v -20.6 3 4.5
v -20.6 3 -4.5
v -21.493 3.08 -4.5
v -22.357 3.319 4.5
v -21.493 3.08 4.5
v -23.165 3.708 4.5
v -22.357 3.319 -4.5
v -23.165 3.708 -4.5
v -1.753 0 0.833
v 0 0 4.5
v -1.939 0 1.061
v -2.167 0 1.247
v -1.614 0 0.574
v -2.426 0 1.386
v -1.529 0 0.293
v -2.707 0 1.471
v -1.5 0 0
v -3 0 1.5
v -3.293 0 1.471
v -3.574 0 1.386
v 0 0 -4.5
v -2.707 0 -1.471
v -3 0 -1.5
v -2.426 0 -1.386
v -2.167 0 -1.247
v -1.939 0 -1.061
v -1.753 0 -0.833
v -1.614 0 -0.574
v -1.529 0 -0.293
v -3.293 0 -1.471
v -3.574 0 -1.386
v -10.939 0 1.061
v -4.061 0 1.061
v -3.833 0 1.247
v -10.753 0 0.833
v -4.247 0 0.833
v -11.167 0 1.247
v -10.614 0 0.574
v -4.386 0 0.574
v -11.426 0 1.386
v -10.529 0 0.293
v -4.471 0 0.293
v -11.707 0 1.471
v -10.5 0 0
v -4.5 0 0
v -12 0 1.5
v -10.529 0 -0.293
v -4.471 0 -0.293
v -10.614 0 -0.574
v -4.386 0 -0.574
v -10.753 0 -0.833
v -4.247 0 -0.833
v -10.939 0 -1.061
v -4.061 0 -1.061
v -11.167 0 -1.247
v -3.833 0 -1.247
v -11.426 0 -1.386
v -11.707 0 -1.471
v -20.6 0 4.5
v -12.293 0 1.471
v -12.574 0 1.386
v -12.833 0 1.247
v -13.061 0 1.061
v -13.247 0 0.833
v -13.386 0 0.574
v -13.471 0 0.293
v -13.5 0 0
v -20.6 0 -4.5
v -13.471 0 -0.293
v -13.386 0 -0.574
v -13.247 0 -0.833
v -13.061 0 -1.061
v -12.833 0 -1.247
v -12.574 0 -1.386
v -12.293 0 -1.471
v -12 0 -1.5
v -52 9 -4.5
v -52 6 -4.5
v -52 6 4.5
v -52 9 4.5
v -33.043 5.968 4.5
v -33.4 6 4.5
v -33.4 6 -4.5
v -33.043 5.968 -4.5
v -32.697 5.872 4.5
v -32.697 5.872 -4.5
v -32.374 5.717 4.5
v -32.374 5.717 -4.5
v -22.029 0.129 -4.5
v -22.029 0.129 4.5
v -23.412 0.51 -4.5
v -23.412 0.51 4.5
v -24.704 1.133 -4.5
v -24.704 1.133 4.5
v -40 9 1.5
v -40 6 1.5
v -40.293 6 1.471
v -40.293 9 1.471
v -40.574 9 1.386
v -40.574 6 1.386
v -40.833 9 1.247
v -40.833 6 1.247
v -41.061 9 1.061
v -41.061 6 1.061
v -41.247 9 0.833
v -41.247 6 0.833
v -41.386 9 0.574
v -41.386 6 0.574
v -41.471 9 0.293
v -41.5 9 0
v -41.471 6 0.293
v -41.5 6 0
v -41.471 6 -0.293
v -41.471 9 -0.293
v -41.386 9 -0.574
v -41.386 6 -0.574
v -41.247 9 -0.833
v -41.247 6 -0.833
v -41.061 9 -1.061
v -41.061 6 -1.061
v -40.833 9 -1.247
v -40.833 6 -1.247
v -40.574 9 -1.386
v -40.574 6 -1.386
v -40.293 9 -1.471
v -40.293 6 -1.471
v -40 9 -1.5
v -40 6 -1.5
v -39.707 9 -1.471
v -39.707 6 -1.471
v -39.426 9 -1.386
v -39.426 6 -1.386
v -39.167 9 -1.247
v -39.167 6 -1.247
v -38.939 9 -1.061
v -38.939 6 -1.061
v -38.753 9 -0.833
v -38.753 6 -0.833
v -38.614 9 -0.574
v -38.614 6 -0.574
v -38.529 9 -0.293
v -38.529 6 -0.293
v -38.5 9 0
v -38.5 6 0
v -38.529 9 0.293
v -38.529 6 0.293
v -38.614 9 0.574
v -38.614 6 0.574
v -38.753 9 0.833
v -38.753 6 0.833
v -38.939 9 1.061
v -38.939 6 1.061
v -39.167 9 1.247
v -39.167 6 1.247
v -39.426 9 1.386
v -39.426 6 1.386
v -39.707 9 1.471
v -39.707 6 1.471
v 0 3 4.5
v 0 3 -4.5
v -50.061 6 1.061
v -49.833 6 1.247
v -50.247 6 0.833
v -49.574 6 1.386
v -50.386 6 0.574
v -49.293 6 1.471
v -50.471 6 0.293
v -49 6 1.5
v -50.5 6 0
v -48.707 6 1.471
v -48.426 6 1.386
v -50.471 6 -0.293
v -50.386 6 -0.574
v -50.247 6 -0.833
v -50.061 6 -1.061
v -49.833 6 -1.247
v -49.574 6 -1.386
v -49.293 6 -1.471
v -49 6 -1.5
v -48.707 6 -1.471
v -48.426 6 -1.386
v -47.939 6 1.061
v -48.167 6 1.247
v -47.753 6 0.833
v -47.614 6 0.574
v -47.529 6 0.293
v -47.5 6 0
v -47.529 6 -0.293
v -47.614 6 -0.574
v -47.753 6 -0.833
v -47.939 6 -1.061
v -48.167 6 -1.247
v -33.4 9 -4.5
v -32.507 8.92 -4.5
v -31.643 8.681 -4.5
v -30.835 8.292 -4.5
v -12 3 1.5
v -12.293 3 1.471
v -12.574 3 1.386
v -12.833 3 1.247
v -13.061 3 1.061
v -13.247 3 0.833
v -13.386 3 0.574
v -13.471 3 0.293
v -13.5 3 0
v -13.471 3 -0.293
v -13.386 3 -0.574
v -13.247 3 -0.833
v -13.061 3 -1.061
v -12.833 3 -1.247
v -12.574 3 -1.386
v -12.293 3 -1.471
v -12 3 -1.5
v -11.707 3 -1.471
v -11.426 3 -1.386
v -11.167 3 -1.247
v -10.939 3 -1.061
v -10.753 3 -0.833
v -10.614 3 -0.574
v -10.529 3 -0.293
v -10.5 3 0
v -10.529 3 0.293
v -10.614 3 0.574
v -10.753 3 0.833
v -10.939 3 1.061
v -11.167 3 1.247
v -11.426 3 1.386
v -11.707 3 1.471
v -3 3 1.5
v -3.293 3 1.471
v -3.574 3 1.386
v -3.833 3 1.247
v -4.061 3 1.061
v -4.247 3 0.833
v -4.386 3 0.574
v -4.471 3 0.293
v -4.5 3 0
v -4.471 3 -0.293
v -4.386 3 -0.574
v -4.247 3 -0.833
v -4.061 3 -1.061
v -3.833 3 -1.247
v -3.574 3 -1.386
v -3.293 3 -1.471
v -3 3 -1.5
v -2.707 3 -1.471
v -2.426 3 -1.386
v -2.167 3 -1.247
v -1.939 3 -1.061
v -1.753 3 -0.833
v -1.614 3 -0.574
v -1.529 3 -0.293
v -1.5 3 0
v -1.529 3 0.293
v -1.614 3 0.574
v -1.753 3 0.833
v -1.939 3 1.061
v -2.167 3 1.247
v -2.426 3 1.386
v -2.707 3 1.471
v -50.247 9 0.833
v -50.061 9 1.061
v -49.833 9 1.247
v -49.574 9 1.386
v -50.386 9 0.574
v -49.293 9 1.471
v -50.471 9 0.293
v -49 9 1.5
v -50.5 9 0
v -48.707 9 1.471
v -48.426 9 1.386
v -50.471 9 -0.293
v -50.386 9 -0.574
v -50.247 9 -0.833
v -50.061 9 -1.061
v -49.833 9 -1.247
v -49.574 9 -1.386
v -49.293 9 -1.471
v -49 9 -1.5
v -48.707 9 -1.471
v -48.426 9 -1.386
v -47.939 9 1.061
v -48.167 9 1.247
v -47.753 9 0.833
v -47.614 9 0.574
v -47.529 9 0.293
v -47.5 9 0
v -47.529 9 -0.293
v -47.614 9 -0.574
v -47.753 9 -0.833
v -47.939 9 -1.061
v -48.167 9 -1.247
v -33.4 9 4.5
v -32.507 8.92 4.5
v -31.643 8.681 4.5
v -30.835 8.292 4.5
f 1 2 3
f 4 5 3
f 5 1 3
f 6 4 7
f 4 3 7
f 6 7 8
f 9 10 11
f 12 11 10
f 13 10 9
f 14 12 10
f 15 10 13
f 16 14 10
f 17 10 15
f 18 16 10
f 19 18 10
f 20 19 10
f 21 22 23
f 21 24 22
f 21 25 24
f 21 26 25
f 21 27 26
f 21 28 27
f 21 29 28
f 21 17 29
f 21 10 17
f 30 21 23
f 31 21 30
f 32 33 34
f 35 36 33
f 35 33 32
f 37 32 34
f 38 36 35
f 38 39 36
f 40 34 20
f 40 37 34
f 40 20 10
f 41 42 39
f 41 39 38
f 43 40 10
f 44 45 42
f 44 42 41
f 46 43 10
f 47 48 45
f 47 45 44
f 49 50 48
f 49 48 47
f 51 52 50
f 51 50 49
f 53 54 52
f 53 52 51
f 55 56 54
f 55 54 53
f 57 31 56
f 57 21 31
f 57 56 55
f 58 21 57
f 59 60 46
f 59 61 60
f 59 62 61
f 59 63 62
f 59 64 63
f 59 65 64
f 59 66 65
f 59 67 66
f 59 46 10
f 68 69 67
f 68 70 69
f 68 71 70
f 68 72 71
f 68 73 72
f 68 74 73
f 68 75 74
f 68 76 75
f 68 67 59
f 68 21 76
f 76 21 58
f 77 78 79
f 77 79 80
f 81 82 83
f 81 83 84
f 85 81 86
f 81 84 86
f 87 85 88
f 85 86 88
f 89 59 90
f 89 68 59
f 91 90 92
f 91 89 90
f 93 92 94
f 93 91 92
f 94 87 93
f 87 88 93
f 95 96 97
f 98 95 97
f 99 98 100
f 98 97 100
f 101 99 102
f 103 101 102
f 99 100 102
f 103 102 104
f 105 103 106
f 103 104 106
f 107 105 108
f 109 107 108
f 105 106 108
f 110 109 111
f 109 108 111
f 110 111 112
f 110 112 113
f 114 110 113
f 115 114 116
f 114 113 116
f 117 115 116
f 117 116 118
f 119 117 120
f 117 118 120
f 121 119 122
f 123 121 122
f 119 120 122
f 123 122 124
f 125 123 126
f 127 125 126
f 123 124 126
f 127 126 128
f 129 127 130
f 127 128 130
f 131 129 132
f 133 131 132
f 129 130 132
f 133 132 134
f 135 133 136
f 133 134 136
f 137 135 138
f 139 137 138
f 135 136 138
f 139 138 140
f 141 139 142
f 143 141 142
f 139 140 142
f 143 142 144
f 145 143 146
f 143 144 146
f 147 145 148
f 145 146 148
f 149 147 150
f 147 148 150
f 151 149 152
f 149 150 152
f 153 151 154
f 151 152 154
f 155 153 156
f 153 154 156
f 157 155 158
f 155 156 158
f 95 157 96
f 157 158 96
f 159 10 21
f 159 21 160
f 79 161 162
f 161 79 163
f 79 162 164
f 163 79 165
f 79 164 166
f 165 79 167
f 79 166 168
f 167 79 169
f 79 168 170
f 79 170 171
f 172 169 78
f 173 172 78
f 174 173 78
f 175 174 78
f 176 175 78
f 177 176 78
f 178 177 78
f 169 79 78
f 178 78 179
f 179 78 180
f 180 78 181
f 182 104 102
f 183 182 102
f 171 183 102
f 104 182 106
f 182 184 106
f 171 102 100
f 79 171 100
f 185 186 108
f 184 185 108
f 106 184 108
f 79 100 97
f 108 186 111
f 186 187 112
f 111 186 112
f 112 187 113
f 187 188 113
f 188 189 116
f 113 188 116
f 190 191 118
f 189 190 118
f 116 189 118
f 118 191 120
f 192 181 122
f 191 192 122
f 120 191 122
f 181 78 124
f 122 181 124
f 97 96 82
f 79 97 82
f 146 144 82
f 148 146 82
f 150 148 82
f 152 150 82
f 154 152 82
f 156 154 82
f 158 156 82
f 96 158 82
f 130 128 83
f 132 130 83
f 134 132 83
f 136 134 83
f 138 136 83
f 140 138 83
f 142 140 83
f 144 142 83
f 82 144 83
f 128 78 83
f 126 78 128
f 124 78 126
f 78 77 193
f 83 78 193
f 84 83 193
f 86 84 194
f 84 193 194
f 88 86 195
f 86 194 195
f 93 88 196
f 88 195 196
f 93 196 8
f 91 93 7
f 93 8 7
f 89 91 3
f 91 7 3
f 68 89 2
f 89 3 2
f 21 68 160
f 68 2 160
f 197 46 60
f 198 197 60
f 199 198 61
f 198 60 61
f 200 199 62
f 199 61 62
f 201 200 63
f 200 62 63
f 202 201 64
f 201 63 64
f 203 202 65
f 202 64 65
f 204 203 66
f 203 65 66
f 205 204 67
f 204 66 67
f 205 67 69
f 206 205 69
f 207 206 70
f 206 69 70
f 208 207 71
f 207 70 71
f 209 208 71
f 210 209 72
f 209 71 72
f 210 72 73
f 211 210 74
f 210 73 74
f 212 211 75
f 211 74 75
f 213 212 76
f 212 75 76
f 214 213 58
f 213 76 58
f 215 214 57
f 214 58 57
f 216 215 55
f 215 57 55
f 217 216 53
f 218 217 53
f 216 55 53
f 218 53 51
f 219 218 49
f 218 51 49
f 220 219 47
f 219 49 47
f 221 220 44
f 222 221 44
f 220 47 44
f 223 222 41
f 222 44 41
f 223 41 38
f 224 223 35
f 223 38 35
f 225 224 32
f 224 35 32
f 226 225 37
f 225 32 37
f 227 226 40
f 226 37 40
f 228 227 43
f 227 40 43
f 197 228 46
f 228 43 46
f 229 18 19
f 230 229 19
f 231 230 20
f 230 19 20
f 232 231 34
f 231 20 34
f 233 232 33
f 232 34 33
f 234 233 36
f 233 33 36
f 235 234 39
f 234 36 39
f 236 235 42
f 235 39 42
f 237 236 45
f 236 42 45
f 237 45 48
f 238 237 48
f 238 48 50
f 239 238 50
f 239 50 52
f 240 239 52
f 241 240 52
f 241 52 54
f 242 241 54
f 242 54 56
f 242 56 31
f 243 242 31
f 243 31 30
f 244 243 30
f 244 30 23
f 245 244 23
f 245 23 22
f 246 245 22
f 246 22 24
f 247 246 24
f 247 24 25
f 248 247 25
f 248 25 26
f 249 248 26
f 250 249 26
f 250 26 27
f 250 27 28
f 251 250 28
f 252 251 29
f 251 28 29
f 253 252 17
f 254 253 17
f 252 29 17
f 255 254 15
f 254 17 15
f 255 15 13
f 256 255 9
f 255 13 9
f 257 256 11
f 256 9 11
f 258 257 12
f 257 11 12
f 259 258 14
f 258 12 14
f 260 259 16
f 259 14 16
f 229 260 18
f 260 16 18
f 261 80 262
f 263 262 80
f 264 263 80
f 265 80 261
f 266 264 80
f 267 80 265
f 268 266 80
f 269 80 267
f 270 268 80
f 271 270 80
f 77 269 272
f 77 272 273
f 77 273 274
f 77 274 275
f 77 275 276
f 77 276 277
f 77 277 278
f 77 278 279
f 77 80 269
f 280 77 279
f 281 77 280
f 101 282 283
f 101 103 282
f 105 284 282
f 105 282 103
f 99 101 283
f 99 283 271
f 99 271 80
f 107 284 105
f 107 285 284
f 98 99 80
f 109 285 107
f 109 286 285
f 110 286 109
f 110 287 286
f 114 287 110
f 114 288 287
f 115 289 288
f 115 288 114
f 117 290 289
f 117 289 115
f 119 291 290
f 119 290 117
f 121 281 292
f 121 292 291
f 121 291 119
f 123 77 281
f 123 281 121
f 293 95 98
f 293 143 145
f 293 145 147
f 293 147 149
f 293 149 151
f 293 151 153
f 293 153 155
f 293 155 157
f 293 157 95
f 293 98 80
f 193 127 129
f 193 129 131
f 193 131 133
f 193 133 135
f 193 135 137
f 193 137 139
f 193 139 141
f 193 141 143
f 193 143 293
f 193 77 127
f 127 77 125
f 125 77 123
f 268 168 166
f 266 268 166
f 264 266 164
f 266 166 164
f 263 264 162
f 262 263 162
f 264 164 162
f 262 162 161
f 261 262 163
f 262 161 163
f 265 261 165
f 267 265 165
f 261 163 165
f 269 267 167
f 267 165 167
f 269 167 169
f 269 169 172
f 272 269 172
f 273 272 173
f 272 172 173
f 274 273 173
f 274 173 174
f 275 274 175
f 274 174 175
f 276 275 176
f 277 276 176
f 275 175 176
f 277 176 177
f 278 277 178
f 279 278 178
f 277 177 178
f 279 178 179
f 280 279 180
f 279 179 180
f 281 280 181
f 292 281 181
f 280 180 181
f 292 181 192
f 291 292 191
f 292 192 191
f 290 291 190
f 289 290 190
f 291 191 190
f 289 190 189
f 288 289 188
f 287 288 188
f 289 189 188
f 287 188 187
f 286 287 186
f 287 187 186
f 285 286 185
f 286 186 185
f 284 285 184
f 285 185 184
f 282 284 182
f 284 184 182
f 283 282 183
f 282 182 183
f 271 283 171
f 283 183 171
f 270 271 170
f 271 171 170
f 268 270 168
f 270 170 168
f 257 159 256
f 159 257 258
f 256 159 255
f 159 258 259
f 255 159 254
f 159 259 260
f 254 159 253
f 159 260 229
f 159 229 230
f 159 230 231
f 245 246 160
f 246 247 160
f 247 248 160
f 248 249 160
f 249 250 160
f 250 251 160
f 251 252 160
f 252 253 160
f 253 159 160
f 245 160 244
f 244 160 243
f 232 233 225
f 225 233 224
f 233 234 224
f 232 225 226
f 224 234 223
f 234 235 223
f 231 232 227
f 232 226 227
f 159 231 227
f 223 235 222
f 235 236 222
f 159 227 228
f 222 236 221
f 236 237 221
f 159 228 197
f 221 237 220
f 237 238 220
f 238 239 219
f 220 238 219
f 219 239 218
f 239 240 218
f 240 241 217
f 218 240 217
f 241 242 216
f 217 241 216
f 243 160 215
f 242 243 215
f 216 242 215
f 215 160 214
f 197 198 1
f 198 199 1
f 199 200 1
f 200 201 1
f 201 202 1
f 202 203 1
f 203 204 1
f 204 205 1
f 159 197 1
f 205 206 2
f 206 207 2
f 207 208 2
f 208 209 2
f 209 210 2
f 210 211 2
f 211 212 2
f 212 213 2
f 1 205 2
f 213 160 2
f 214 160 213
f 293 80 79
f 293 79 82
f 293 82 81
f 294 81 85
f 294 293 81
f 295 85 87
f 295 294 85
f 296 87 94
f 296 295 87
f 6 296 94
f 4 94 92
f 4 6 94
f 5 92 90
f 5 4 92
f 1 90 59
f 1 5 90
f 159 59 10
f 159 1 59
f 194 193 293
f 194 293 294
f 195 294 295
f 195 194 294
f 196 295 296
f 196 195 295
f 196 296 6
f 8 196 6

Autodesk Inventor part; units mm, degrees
ref_plane "YZ Plane" through (0, 0, 0) normal (1, 0, 0) x (0, 1, 0)
ref_plane "XZ Plane" through (0, 0, 0) normal (0, 1, 0) x (-1, 0, 0)
sketch "Sketch1" plane through (0, 0, 0) normal (0, 0, 1) x (1, 0, 0)
  line L0 (0, 0) -> (0, 3)
  line L1 (0, 0) -> (0, 40.1132) construction
  arc A0 (-23.165, 3.7081) -> (-20.6, 3) centre (-20.6, 8) ccw
  line L2 (0, 3) -> (-20.6, 3)
  line L3 (0, 0) -> (-20.6, 0)
  arc A1 (-24.704, 1.1329) -> (-20.6, 0) centre (-20.6, 8) ccw
  line L4 (-52, 6) -> (-33.4, 6)
  line L5 (-52, 6) -> (-52, 9)
  line L6 (-52, 9) -> (-33.4, 9)
  circle A2 centre (-33.4, 4) radius 2
  arc A3 (-30.835, 8.2919) -> (-37.9826, 6) centre (-33.4, 4) ccw
  line L7 (-32.374, 5.7168) -> (-24.704, 1.1329)
  line L8 (-30.835, 8.2919) -> (-23.165, 3.7081)
  dimension "d9" = 4
  dimension "d0" = 20.6
  dimension "d2" = 10
  dimension "d3" = 3
  dimension "d4" = 6
  dimension "d5" = 12.8
  dimension "d6" = 3
  dimension "d7" = 18.6
  dimension "d8" = 18.6
  dimension "d10" = 10
  dimension "d11" = 12.8
extrude "Extrusion1" add sketch "Sketch1" along normal mid plane 9 contours L3 A1 L7 A2 L4 A3 L8 A0 L2 L0 | A3 L4 L5 L6
ref_plane "Work Plane1" through (-52, 11, 4.5) normal (0, 1, 0) x (1, 0, 0)
sketch "Sketch2" plane through (-52, 11, 4.5) normal (0, 1, 0) x (1, 0, 0)
  line L0 (0, 9) -> (0, 0) projected
  line L1 (31.4, 9) -> (52, 9) projected
  line L2 (18.6, 9) -> (0, 9) projected
  line L3 (3, 9) -> (3, 0) construction
  line L4 (18.6, 0) -> (0, 0) projected
  line L5 (12, 9) -> (12, 0) construction
  line L6 (49, 9) -> (49, 0) construction
  line L7 (31.4, 0) -> (52, 0) projected
  line L8 (0, 4.5) -> (52, 4.5) construction
  line L9 (52, 9) -> (52, 0) projected
  line L10 (40, 9) -> (40, 0) construction
  circle A0 centre (3, 4.5) radius 1.5
  circle A1 centre (12, 4.5) radius 1.5
  circle A2 centre (40, 4.5) radius 1.5
  circle A3 centre (49, 4.5) radius 1.5
  dimension "d15" = 3
  dimension "d16" = 9
  dimension "d17" = 3
  dimension "d18" = 9
  dimension "d19" = 3
  dimension "d20" = 3
  dimension "d21" = 3
  dimension "d22" = 3
hole "Hole1" at (-12, 11, 0) at (-3, 11, 0) at (-40, 11, 0) at (-49, 11, 0) direction (0, -1, 0) diameter 3 end through all
equation "\"d8\" = d7"
properties part number "Hudson 1-68"
